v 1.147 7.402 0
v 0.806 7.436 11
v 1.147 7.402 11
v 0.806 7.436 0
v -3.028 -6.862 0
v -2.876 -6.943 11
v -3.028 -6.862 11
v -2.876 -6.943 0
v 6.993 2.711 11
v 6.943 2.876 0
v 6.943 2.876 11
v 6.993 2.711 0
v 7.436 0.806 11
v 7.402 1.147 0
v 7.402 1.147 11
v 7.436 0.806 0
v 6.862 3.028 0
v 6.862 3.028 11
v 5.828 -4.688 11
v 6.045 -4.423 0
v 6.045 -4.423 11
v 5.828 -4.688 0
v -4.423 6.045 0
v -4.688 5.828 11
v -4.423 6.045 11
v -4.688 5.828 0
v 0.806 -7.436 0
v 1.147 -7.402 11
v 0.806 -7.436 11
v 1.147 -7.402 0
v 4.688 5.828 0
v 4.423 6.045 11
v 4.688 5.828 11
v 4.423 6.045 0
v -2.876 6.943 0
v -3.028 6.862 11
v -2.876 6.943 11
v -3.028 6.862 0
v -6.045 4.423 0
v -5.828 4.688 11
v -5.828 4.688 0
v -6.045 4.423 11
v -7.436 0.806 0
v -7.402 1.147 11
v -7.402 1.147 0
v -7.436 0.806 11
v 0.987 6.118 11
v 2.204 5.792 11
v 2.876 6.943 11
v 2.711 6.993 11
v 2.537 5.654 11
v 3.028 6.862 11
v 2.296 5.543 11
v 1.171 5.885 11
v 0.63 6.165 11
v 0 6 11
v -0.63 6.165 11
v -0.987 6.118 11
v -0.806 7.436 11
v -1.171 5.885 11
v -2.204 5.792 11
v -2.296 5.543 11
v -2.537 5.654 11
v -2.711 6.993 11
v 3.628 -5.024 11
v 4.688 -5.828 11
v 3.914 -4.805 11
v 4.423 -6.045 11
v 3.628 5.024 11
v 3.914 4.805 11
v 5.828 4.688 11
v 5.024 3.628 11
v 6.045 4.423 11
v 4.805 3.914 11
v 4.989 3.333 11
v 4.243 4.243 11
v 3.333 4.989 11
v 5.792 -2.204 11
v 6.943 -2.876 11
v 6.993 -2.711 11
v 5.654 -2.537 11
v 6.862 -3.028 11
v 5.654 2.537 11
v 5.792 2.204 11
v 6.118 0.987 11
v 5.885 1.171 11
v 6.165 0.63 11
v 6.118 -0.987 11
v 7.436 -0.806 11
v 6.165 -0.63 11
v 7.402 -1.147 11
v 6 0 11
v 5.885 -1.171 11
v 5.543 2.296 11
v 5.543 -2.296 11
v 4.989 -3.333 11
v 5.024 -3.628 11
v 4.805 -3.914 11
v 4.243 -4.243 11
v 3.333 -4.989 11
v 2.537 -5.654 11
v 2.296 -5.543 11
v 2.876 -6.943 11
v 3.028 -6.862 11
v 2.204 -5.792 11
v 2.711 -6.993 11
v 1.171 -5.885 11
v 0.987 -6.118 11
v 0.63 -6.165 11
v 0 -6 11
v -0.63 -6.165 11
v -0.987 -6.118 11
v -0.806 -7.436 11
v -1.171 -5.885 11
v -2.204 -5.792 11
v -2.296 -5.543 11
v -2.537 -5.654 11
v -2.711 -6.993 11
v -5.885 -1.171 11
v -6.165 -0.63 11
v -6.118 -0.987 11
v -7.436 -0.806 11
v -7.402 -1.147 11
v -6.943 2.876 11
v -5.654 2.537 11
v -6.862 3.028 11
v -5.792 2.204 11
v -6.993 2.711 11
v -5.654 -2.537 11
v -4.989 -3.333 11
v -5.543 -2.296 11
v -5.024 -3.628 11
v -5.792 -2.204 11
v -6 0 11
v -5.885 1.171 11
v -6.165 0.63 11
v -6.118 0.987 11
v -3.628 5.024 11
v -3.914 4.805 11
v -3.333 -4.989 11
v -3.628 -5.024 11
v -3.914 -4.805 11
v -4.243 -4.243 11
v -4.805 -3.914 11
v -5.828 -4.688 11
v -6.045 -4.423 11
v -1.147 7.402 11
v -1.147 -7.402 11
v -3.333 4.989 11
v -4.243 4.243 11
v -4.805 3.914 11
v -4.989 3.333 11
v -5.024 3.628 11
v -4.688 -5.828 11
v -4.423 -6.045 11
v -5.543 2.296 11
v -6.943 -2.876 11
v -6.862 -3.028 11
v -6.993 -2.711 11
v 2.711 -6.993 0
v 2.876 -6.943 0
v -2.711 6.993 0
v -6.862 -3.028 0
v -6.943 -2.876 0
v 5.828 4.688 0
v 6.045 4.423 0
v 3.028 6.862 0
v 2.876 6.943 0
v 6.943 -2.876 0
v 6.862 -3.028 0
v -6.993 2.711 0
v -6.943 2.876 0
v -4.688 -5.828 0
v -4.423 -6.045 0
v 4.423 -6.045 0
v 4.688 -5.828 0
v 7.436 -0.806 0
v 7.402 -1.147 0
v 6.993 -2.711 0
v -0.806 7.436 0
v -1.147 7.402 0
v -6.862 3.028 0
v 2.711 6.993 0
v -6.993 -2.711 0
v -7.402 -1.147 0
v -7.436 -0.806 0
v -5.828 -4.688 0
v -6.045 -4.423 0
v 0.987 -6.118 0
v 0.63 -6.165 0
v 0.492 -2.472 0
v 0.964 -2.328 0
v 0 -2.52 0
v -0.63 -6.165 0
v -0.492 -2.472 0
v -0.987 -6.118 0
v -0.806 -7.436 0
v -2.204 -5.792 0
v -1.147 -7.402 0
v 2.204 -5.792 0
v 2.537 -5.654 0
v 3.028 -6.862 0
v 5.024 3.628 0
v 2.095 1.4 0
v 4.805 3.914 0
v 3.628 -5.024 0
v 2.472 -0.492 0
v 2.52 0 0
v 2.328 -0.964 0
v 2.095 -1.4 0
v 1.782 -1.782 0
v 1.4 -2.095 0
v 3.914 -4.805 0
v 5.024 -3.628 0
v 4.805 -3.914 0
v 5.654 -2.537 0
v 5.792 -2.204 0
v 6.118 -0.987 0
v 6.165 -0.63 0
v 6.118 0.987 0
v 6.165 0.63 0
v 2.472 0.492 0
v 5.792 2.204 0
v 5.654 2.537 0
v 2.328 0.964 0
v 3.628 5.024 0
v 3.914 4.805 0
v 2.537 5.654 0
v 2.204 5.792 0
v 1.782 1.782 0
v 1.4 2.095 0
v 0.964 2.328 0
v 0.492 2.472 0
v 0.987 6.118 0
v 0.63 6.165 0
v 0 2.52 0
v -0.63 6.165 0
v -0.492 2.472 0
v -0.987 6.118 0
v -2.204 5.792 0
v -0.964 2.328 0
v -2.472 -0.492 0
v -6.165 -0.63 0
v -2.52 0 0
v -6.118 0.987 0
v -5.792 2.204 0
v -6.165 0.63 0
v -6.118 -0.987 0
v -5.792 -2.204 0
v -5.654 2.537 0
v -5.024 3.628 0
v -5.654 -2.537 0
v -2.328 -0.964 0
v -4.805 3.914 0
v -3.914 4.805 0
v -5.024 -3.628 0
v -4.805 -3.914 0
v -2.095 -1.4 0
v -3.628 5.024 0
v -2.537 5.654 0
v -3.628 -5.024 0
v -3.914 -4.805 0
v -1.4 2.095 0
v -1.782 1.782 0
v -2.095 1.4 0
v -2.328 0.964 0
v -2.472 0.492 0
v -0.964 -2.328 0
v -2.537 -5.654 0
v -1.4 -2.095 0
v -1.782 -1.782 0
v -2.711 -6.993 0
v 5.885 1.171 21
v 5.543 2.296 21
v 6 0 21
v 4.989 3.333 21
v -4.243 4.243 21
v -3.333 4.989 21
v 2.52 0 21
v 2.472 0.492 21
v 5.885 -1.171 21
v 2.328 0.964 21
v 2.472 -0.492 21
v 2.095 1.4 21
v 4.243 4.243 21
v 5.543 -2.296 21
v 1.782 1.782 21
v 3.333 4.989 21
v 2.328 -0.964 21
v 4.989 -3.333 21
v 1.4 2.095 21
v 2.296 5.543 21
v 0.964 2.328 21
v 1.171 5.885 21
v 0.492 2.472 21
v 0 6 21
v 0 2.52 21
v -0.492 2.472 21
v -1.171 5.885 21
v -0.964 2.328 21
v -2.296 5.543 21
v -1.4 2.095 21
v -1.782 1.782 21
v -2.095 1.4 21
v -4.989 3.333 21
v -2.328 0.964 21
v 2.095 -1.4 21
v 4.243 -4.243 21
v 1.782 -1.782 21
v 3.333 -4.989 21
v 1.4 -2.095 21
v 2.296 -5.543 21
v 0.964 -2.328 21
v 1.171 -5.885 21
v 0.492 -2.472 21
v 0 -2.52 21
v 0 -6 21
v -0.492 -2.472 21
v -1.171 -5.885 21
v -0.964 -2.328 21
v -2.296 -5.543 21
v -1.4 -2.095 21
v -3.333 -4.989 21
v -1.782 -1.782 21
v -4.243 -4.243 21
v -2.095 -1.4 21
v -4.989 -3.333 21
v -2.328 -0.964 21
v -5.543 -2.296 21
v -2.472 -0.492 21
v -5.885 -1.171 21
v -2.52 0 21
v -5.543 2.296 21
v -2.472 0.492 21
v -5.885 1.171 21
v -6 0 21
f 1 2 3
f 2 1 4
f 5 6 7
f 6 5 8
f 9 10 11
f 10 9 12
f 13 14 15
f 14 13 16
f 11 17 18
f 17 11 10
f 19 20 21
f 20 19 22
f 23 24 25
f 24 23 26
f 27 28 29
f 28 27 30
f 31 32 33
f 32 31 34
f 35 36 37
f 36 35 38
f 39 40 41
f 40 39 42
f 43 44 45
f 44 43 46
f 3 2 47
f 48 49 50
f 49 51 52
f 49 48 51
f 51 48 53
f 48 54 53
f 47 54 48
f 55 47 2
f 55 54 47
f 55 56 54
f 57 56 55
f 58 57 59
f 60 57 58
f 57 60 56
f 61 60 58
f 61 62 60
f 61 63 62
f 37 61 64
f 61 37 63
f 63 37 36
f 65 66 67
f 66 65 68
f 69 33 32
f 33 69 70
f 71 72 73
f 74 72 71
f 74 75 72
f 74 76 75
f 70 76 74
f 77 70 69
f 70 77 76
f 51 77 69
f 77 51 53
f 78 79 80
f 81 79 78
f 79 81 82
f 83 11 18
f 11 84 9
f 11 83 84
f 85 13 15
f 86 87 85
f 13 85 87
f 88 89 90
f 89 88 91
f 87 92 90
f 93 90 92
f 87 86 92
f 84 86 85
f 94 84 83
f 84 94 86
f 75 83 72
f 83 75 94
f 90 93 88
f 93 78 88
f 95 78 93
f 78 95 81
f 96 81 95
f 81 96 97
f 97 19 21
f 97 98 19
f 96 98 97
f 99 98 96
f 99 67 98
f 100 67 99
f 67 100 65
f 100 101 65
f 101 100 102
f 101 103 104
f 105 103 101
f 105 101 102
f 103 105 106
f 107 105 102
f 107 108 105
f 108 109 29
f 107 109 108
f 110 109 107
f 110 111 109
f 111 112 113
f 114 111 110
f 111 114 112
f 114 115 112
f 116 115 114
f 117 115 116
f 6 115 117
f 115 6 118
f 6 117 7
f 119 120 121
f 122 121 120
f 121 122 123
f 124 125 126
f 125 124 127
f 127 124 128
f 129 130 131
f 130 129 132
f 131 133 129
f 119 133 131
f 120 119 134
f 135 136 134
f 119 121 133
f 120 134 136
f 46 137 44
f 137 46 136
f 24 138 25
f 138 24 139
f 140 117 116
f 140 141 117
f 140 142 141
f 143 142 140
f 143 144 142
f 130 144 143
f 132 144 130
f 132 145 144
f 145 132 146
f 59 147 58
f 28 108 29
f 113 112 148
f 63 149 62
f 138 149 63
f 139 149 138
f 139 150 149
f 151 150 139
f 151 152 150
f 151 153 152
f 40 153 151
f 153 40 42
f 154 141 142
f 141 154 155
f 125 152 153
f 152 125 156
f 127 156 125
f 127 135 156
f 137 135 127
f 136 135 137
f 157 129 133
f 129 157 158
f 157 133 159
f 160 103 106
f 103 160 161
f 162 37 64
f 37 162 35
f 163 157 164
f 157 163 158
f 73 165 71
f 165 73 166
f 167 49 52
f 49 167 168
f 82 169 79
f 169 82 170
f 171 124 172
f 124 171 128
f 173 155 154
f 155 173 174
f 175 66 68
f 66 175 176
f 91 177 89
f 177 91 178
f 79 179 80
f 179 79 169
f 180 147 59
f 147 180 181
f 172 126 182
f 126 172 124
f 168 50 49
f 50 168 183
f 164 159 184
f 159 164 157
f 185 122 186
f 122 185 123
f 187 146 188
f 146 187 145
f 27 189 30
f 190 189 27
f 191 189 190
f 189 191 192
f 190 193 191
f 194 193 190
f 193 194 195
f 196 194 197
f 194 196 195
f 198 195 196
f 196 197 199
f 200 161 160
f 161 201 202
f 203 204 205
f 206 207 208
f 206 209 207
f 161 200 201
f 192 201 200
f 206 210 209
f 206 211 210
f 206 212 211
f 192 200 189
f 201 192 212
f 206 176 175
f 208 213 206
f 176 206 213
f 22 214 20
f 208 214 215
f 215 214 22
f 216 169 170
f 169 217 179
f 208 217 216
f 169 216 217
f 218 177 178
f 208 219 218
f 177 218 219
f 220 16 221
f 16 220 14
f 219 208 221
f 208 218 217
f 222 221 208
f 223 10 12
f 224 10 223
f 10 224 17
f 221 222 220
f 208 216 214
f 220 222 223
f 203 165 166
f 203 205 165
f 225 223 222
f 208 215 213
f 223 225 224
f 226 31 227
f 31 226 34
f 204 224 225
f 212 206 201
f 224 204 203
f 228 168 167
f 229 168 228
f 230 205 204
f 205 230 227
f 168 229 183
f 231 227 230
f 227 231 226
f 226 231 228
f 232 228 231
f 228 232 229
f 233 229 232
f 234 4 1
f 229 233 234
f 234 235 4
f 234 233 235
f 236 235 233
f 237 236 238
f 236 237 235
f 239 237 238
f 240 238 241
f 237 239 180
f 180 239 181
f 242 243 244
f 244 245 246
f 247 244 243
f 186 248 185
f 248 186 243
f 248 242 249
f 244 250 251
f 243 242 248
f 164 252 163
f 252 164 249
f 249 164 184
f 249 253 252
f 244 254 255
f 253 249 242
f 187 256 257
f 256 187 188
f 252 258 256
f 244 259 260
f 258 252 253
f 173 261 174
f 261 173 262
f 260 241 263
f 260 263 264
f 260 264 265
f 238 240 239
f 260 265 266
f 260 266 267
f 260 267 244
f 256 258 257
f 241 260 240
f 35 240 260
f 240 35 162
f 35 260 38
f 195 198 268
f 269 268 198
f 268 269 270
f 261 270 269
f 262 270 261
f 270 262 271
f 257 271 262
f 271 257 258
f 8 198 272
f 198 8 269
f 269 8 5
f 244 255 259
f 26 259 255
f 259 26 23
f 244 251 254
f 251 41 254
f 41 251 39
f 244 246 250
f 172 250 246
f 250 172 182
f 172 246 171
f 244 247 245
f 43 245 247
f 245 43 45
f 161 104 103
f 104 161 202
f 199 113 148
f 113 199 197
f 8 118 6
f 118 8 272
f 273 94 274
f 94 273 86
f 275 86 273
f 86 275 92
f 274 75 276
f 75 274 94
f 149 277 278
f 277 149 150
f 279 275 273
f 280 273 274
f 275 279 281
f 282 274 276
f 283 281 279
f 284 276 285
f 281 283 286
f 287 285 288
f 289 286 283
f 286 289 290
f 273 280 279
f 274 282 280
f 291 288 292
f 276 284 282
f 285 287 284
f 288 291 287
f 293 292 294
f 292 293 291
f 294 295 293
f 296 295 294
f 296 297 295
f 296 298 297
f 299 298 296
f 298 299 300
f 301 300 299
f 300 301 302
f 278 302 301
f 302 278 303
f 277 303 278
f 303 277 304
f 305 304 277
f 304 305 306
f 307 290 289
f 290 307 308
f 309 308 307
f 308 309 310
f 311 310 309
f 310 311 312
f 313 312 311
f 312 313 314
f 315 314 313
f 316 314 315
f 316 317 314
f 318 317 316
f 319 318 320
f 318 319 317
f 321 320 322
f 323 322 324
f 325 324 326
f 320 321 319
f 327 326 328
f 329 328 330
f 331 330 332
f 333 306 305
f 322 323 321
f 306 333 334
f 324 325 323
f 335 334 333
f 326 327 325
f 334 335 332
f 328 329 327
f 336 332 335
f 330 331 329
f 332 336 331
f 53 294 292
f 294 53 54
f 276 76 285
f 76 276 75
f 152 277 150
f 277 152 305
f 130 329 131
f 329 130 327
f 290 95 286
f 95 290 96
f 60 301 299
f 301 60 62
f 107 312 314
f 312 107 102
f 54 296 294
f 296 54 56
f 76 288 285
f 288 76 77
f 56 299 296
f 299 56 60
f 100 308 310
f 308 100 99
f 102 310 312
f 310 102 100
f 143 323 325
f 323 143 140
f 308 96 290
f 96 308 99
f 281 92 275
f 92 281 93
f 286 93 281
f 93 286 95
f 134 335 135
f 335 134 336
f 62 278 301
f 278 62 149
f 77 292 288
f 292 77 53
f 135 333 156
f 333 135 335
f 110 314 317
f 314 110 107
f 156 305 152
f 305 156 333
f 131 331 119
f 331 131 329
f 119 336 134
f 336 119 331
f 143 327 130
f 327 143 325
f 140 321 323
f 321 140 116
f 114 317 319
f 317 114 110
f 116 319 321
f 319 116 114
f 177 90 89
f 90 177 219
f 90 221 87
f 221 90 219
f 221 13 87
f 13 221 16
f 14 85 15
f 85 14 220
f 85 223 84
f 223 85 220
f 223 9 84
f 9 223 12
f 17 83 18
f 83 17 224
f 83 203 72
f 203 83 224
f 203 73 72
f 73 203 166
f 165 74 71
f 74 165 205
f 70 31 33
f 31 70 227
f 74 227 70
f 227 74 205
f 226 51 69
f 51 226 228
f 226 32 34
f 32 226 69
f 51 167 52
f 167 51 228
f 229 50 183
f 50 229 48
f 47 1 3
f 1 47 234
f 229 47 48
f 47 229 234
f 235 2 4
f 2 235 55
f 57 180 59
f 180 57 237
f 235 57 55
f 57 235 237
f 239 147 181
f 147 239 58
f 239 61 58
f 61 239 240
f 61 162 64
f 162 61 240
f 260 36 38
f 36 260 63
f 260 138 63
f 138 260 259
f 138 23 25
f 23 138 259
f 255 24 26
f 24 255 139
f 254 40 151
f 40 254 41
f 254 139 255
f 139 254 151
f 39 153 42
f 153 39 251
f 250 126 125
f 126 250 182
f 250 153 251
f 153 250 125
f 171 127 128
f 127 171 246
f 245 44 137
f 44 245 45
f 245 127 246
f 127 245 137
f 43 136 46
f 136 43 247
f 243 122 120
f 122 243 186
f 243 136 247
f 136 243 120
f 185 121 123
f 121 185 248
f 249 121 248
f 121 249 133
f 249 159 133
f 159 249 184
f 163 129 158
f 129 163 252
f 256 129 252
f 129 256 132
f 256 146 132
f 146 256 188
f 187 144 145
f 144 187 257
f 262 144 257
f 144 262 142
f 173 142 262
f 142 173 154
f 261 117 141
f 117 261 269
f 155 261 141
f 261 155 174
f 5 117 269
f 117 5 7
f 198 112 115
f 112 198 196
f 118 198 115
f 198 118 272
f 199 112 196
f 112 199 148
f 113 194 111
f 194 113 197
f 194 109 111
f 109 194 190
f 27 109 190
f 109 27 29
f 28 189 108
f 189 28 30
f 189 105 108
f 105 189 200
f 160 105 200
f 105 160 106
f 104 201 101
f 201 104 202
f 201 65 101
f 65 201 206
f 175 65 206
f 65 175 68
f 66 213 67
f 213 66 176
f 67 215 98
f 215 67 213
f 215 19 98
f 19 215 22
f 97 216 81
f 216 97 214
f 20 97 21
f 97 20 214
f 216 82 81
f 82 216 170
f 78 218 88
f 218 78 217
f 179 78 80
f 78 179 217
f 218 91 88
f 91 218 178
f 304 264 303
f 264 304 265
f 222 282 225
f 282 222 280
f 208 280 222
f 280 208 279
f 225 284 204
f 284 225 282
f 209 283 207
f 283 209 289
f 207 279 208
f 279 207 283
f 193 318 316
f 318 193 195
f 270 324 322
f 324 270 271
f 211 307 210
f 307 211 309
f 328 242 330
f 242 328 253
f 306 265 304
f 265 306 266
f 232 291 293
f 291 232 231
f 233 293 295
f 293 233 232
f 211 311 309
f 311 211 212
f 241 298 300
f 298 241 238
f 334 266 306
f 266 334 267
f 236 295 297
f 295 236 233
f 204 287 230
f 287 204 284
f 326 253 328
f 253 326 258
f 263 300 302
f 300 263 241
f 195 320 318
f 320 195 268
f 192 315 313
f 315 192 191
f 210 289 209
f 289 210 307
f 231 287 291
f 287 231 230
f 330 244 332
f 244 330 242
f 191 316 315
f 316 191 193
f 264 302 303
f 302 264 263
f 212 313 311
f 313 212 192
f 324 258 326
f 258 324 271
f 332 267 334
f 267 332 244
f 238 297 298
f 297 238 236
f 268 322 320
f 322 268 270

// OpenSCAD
$fn = 32;

// ----------------------------------------------------------------------
// Timing pulley: GT2 24T, pitch 2 mm, 15.03 mm x 21 mm
// ----------------------------------------------------------------------

// --- parameters (mm) ---
pitch_mm = 2;             // belt pitch
tooth_count = 24;         // number of grooves
width = 11;               // belt width between the flanges
tip_d = 15.03;            // tip circle diameter
root_d = 13.53;           // groove bottom diameter
groove_h = 0.75;          // groove depth
tooth_w = 1.5;            // groove width at the tip circle
hub_bore = 5.04;          // shaft bore
hub_d = 12;               // hub diameter
hub_h = 10;               // hub above the flange
bottom_z = 0;             // lowest point of the pulley
top_z = 21;               // highest point of the pulley

module rim() {
  cylinder(h = width, d = tip_d);
}

module groove_cutter() {
  /* belt tooth groove: deeper than wide, cut through the belt width */
  translate([root_d / 2, 0, 0])
    linear_extrude(height = width)
      polygon(points = [[-0.6, -tooth_w * 0.42], [groove_h + 0.6, -tooth_w * 0.6],
                        [groove_h + 0.6, tooth_w * 0.6], [-0.6, tooth_w * 0.42]]);
}

module hub() {
  translate([0, 0, bottom_z]) cylinder(h = top_z - bottom_z, d = hub_d);
}

difference() {
  union() {
    rim();
    hub();
  }
  for (i = [0 : tooth_count - 1]) rotate([0, 0, i * 360 / tooth_count]) groove_cutter();
  translate([0, 0, bottom_z - 1]) cylinder(h = top_z - bottom_z + 2, d = hub_bore);
}
